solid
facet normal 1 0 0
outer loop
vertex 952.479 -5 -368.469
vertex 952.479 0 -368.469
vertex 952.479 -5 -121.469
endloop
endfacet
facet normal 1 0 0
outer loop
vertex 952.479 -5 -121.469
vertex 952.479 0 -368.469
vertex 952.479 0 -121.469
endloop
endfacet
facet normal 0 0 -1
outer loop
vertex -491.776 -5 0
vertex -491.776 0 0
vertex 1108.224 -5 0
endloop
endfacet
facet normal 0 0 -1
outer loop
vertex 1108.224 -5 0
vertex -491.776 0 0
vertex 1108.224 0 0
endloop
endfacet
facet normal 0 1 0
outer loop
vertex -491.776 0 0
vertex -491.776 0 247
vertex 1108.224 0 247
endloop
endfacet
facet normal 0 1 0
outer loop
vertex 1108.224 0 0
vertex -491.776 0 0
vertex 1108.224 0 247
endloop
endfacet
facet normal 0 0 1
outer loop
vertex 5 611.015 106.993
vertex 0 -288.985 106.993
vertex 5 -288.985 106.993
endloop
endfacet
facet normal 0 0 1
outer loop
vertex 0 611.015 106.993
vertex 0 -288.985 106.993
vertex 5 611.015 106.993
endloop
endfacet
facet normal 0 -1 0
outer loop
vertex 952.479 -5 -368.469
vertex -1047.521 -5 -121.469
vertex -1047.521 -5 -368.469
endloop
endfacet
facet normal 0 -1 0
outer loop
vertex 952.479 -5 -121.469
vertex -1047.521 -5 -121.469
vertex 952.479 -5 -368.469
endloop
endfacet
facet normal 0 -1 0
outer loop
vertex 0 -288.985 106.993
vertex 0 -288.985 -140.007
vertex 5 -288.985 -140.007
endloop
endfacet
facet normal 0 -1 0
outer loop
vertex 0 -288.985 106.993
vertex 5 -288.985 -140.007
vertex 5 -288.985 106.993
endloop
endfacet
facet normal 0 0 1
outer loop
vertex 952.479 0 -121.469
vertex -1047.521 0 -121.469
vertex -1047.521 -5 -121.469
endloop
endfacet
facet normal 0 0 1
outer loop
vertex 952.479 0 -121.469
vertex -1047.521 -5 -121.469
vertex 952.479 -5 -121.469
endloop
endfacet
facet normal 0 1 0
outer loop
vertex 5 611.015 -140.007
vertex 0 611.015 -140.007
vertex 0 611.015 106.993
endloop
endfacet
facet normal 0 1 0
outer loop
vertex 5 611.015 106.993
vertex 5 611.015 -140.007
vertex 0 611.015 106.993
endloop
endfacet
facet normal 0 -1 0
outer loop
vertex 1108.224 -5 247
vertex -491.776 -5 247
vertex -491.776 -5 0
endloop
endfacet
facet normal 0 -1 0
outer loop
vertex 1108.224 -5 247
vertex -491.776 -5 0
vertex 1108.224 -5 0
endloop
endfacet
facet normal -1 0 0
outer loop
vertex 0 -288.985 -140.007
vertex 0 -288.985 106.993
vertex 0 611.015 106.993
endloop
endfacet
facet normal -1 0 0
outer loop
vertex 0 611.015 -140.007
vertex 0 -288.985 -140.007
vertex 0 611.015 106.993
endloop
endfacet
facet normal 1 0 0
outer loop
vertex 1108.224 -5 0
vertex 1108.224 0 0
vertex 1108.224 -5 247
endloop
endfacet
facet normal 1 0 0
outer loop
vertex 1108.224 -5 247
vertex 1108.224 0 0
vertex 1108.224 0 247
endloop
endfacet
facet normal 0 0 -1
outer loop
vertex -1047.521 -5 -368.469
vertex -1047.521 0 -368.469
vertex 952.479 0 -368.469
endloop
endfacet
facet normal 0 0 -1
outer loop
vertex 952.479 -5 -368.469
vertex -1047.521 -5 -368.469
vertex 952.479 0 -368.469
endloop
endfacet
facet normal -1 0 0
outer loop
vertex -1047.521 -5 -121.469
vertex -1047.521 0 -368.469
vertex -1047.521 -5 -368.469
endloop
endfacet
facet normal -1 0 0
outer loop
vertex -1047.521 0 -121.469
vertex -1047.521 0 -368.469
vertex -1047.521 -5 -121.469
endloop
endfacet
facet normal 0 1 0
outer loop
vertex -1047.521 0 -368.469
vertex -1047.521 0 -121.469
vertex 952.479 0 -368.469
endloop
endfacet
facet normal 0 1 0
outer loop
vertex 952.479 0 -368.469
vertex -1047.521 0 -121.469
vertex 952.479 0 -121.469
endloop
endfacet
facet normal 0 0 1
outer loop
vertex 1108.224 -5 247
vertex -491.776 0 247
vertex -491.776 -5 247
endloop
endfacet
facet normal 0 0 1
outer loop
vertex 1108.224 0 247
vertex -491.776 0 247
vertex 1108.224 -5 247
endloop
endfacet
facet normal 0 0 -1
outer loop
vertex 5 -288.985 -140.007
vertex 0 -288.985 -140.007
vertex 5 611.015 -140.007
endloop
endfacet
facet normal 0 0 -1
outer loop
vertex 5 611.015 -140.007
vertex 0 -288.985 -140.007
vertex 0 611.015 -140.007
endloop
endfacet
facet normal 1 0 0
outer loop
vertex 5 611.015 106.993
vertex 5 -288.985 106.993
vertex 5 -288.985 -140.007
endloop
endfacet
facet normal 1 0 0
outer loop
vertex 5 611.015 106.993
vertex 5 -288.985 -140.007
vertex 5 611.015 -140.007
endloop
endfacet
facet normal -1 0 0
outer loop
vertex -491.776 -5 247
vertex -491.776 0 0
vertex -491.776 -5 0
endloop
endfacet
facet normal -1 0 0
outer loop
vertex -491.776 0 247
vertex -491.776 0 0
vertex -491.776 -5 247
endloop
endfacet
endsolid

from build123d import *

# Parameters (mm, degrees)
F0_W     = 2000
F0_H     = 247
F1_DEPTH = 5
F2_W     = 900
F2_H     = 247
F4_DEPTH = 5
F3_W     = 1600
F3_H     = 247
F5_DEPTH = 5


with BuildPart() as f1:
    # F0 (on Front) → F1 (new body)
    with BuildSketch(Plane.XZ):
        with Locations((-47.52098, -244.968501)):
            Rectangle(F0_W, F0_H)
    extrude(amount=F1_DEPTH)


with BuildPart() as f4:
    # F2 (on Right) → F4 (new body)
    with BuildSketch(Plane.YZ):
        with Locations((161.015469, -16.507458)):
            Rectangle(F2_W, F2_H)
    extrude(amount=F4_DEPTH)


with BuildPart() as f5:
    # F3 (on Front) → F5 (new body)
    with BuildSketch(Plane.XZ):
        with Locations((308.223587, 123.5)):
            Rectangle(F3_W, F3_H)
    extrude(amount=F5_DEPTH)


solid = Compound([f1.part, f4.part, f5.part])
